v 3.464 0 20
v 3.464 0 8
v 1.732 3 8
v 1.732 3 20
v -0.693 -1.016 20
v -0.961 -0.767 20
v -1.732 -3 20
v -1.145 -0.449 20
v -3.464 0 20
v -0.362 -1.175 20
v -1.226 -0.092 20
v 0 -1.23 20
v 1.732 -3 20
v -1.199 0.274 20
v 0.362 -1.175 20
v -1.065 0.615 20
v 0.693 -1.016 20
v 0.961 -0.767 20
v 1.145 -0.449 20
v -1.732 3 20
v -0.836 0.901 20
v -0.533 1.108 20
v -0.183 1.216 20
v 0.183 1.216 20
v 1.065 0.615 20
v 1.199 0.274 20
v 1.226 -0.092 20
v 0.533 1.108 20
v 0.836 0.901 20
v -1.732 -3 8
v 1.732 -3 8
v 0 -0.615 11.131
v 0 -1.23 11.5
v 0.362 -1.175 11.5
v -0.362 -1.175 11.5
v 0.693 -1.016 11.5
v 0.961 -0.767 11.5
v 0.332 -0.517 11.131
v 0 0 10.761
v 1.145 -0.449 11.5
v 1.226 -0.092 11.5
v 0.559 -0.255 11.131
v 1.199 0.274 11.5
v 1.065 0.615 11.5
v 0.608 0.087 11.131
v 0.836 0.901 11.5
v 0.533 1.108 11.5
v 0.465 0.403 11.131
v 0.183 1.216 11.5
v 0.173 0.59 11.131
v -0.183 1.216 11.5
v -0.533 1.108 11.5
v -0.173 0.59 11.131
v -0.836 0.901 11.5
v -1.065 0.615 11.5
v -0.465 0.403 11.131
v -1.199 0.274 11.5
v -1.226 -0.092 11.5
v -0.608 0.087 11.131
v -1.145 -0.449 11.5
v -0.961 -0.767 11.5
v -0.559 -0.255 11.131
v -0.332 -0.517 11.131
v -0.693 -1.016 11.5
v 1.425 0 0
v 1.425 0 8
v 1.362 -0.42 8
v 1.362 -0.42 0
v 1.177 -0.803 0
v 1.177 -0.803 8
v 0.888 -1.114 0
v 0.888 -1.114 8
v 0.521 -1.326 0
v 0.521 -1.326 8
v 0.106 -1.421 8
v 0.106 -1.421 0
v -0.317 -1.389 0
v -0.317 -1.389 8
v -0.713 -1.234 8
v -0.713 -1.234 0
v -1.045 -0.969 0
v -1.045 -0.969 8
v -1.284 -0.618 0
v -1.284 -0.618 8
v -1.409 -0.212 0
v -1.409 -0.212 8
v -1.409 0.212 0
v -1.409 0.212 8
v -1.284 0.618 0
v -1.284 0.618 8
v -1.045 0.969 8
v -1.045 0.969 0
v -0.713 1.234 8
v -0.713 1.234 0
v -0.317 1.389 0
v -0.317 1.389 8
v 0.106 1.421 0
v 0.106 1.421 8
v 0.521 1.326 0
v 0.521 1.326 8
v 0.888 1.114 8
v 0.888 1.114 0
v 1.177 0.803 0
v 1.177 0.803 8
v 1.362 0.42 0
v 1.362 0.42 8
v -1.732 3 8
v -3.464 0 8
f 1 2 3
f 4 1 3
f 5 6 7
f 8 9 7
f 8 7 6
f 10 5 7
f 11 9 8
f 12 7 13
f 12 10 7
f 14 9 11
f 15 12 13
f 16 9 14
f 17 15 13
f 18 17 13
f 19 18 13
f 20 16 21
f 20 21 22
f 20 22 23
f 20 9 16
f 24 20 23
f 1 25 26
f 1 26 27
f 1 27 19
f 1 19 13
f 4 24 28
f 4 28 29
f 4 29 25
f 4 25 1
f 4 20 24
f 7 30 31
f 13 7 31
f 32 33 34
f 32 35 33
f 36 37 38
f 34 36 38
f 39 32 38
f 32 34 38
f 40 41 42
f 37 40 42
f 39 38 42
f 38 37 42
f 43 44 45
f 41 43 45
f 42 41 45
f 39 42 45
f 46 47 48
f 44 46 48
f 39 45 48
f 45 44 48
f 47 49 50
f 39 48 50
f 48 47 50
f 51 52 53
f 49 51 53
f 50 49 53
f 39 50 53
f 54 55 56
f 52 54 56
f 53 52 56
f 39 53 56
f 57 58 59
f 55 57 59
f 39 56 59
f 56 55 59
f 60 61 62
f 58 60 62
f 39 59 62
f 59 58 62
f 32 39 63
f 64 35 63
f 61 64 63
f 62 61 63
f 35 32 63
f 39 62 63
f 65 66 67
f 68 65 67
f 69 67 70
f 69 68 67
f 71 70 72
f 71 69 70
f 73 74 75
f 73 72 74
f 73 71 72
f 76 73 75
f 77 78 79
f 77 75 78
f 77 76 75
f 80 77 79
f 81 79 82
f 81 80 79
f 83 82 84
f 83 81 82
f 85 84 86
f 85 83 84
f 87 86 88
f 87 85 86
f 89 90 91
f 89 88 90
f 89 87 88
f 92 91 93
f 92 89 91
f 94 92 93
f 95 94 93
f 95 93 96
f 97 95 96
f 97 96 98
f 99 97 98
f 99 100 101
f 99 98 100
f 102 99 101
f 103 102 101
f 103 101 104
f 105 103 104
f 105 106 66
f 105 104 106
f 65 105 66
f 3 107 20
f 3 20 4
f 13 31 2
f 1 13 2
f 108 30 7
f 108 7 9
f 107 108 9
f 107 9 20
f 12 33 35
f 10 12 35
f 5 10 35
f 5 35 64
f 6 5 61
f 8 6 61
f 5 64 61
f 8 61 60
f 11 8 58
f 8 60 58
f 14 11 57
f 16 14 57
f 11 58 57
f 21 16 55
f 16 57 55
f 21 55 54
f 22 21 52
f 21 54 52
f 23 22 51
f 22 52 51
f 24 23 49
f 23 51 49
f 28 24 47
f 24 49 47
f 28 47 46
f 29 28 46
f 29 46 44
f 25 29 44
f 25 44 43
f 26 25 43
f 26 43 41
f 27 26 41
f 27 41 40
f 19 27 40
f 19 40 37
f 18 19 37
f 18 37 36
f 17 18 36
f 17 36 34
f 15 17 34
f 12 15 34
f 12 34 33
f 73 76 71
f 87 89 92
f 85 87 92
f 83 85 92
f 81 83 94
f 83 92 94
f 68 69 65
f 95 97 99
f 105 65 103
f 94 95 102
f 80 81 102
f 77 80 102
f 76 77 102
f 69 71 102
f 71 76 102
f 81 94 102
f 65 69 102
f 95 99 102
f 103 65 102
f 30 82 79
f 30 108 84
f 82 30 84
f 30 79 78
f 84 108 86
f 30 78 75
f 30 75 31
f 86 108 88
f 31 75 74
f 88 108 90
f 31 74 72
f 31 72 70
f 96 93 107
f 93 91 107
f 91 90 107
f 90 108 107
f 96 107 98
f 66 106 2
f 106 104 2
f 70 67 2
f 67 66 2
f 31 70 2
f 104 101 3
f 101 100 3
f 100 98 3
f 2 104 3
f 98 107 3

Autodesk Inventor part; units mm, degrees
ref_plane "Plan YZ" through (0, 0, 0) normal (1, 0, 0) x (0, 1, 0)
ref_plane "Plan XZ" through (0, 0, 0) normal (0, 1, 0) x (-1, 0, 0)
ref_plane "Plan XY" through (0, 0, 0) normal (0, 0, 1) x (1, 0, 0)
sketch "Esquisse1" plane through (0, 0, 0) normal (0, 0, 1) x (1, 0, 0)
  circle A0 centre (0, 0) radius 1.425
  dimension "d0" = 2.85
extrude "Extrusion1" add sketch "Esquisse1" along normal blind 8
sketch "Esquisse6" plane through (0, 0, 8) normal (0, 0, 1) x (1, 0, 0)
  line L0 (-4.8497, 0) -> (4.8497, 0) construction
  line L1 (0, -4.2) -> (0, 4.2) construction
  line L2 (-1.7321, -3) -> (-3.4641, 0)
  line L3 (-3.4641, 0) -> (-1.7321, 3)
  line L4 (-1.7321, 3) -> (0, 3)
  line L5 (-1.7321, -3) -> (0, -3)
  line L6 (1.7321, -3) -> (3.4641, 0)
  line L7 (3.4641, 0) -> (1.7321, 3)
  line L8 (1.7321, 3) -> (0, 3)
  line L9 (1.7321, -3) -> (0, -3)
  point P0 (0, 0)
  dimension "d4" = 6
  dimension "d8" = 120
  dimension "d10" = 6
extrude "Extrusion2" add sketch "Esquisse6" along normal blind 12
sketch "Esquisse7" plane through (0, 0, 20) normal (0, 0, 1) x (1, 0, 0)
  circle A0 centre (0, 0) radius 1.425 projected
hole "Perçage1" at (0, 0, 20) direction (0, 0, -1) diameter 2.459 depth 8.5 tip angle 118 thread size "M3x0.5" class "6H" standard "ISO M"
thread "Filetage1" size "M3x0.5" class "6g" standard "ISO M" full length
properties part number "entretoise12xM3" material "."
